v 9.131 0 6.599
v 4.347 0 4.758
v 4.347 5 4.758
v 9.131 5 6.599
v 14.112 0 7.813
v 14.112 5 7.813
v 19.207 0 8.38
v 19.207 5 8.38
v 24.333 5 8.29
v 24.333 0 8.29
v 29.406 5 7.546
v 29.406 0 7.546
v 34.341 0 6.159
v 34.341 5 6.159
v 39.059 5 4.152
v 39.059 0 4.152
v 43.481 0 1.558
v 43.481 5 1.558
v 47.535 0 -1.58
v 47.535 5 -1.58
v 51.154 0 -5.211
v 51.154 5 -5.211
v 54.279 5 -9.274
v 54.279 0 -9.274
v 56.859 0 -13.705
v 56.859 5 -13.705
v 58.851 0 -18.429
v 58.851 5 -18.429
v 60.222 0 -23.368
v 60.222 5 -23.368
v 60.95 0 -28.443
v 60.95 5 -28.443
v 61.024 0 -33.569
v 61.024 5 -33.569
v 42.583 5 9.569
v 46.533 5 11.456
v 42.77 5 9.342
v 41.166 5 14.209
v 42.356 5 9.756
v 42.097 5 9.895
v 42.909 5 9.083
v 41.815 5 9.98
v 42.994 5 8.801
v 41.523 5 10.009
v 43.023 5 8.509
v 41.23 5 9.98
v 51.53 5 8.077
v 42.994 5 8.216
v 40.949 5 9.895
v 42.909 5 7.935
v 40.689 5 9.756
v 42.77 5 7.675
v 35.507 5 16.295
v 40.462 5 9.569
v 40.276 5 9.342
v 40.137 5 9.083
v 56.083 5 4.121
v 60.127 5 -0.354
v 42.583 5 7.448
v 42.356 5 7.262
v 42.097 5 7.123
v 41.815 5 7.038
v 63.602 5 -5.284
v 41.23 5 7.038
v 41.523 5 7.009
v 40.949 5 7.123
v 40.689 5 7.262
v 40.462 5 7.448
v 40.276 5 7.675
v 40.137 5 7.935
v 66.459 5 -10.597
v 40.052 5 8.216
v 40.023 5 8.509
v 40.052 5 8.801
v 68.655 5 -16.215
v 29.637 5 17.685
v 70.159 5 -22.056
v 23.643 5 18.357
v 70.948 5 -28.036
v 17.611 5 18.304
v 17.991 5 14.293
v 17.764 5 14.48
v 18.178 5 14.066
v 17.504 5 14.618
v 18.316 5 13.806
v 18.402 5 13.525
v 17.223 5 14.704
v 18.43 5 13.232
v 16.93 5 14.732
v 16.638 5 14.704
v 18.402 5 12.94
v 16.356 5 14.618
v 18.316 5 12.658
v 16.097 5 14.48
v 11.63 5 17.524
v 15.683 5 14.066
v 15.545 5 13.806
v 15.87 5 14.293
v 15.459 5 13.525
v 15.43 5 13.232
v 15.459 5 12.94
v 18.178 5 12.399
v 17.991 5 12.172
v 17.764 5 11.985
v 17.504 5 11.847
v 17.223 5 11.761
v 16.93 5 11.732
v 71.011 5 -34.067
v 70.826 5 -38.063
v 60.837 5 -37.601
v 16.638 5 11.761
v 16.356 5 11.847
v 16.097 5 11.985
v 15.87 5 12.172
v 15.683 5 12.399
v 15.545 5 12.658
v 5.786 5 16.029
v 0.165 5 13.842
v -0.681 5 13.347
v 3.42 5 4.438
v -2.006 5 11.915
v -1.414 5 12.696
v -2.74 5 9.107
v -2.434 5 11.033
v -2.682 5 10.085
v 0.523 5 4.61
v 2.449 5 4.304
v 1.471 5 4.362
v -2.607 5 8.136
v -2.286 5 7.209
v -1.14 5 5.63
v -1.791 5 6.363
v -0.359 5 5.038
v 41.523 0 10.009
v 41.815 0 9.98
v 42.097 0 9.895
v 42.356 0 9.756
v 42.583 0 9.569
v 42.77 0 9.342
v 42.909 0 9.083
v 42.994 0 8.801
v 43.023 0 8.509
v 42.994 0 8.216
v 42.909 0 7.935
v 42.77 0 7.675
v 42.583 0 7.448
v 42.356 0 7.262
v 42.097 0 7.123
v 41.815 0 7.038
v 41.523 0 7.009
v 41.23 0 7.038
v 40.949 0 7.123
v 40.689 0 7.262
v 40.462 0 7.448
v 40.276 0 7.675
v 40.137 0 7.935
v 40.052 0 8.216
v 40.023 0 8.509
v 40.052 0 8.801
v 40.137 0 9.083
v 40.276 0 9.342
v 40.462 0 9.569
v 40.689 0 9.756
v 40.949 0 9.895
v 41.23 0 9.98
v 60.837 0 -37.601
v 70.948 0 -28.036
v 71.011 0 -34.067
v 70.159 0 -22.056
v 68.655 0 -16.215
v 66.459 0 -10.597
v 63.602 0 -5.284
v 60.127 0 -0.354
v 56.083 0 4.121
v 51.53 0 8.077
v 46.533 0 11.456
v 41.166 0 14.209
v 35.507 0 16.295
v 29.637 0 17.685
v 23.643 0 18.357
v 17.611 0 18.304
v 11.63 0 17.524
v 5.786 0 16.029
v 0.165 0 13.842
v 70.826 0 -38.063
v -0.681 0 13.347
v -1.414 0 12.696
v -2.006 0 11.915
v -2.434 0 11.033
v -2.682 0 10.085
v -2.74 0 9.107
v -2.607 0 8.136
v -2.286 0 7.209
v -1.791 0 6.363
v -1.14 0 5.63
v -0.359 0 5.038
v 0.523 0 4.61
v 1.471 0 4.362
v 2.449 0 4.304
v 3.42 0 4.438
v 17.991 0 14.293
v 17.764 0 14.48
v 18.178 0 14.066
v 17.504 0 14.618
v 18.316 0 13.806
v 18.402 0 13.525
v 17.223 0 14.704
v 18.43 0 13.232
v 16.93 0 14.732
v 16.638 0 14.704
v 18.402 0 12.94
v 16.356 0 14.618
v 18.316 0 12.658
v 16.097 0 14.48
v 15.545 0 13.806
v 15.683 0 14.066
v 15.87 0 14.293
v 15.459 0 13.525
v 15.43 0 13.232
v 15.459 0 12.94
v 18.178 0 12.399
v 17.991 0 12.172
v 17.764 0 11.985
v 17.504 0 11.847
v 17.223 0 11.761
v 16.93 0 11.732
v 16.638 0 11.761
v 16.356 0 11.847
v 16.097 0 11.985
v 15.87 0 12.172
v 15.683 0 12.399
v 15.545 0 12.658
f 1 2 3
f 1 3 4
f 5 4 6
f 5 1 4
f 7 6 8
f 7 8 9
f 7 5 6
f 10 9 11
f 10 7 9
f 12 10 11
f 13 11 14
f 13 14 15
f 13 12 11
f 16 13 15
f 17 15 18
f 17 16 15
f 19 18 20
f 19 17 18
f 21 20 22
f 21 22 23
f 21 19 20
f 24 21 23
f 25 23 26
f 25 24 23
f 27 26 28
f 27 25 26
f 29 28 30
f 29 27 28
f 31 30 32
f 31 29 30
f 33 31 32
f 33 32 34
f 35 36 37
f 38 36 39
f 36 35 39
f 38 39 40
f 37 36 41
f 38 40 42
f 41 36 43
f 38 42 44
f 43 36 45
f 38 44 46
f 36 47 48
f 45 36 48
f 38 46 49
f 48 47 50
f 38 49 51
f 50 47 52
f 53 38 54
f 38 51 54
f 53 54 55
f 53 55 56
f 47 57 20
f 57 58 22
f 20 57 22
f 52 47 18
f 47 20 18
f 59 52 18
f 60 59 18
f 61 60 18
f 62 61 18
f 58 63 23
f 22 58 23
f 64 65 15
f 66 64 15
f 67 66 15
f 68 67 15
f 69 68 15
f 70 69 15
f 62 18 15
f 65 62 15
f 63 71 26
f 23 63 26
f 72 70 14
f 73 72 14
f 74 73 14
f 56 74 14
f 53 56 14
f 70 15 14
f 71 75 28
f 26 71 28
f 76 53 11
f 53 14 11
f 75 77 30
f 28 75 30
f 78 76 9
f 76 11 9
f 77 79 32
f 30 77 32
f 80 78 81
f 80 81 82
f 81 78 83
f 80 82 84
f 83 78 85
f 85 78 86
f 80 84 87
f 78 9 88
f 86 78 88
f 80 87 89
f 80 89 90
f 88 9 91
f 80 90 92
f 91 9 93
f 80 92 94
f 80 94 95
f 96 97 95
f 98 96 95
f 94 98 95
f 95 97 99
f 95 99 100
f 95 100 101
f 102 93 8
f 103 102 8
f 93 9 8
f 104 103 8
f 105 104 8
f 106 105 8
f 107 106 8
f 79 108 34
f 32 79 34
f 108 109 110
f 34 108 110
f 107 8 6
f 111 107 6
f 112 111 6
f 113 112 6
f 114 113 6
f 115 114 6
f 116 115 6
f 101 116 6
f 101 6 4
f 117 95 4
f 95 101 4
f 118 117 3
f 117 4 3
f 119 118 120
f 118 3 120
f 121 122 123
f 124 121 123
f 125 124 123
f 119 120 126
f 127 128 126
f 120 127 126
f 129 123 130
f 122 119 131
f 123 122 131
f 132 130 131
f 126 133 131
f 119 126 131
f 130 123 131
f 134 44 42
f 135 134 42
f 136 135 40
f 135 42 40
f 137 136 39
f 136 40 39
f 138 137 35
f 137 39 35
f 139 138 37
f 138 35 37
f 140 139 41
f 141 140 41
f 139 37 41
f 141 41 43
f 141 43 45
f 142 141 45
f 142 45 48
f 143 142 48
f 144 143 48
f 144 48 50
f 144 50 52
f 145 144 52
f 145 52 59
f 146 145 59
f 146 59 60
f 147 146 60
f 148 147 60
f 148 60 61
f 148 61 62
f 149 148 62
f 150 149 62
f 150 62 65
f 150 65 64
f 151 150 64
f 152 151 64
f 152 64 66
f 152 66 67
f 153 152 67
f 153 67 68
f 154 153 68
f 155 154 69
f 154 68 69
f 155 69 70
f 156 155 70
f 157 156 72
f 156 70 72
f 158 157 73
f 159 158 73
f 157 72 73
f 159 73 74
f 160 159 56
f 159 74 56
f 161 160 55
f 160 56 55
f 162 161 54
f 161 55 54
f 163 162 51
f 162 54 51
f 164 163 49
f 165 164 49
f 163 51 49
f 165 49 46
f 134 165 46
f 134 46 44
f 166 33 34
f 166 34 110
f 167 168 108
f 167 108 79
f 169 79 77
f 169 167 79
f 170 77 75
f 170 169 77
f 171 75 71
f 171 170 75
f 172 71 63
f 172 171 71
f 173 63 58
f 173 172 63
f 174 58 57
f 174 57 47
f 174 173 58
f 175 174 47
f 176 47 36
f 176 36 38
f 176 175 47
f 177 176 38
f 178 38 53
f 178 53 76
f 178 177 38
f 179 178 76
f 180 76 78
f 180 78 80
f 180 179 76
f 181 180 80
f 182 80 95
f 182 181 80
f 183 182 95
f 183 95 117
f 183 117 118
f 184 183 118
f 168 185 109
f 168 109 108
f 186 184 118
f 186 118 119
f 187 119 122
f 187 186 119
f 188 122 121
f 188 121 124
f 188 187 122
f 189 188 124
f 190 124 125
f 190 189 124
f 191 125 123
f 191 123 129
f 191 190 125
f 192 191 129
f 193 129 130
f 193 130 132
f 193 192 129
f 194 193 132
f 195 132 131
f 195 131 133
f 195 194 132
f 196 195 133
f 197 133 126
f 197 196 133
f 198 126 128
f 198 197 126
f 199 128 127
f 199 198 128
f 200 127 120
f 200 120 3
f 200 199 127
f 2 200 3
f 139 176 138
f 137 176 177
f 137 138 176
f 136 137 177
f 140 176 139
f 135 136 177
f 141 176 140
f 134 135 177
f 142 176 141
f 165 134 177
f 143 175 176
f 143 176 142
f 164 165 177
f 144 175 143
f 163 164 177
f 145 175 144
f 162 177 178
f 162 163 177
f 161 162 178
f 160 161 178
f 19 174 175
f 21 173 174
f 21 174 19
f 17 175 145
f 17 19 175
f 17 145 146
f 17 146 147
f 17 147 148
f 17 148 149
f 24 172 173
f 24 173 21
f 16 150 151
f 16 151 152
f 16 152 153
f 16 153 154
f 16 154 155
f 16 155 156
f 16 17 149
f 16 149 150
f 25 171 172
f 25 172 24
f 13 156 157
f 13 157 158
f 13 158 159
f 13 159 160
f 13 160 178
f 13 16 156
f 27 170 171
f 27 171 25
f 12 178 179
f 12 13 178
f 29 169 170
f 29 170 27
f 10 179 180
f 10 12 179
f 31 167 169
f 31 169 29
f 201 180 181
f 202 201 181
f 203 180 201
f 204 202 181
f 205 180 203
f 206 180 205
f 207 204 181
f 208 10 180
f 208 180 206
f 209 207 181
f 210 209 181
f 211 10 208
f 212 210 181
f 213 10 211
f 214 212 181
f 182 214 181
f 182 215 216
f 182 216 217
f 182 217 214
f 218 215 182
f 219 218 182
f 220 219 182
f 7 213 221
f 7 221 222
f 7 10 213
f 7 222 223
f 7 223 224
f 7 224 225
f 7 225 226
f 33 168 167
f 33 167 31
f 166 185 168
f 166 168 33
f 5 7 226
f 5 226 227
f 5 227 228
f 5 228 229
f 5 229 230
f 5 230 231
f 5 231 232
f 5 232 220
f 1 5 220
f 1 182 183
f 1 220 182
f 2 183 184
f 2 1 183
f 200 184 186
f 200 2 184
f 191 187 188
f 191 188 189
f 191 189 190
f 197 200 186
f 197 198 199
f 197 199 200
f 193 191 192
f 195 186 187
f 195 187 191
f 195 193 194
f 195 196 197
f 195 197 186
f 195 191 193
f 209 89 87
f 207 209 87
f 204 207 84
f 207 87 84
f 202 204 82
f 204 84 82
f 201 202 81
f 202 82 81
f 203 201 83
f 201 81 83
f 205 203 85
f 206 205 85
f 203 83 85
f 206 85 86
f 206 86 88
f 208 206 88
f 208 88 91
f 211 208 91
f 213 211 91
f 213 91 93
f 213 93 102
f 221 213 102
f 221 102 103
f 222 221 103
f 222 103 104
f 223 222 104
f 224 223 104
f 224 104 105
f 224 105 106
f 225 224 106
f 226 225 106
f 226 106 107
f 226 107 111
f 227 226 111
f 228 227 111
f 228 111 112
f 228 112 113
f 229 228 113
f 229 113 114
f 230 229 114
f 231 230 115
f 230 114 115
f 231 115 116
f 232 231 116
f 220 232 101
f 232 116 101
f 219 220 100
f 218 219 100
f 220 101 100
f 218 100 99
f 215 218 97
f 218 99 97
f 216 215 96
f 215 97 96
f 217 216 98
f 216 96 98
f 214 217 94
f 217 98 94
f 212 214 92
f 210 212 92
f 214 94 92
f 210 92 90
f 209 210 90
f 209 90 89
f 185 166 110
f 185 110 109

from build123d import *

# Parameters (mm, degrees)
EXTRUDE_1_DEPTH     = 5
CUT_EXTRUDE_1_REACH = 82.779
SKETCH_2_R          = 1.5


with BuildPart() as part:
    # 草图1 → 凸台-拉伸1 (new body)
    with BuildSketch(Plane(origin=(0, 0, 0), x_dir=(1, 0, 0), z_dir=(0, 1, 0))):
        with BuildLine():
            Line((61.023746461, 33.569203074), (60.837080184, 37.600567015))
            Line((60.837080184, 37.600567015), (70.826313722, 38.06310353))
            Line((70.826313722, 38.06310353), (71.011329506, 34.067384676))
            ThreePointArc((71.011329506, 34.067384676), (49.082411457, -9.842070835), (0.164945446, -13.841976975))
            ThreePointArc((0.164945446, -13.841976975), (-2.286053035, -7.209284728), (4.346639213, -4.758286247))
            ThreePointArc((4.346639213, -4.758286247), (43.480612021, -1.558361335), (61.023746461, 33.569203074))
        make_face()
    extrude(amount=EXTRUDE_1_DEPTH)

    # 草图2 → 切除-拉伸1 (cut, up to next)
    with BuildSketch(Plane(origin=(0, 5, 0), x_dir=(1, 0, 0), z_dir=(0, 1, 0)), mode=Mode.PRIVATE) as cut_extrude_1_sk1:
        with Locations(Location((16.930413815, -13.232401329, 0), (0, 0, 270))):
            Circle(SKETCH_2_R)
    cut_extrude_1_tool1 = extrude(cut_extrude_1_sk1.sketch, amount=-CUT_EXTRUDE_1_REACH, mode=Mode.PRIVATE) & part.part
    # 草图2 → 切除-拉伸1 (cut, up to next)
    with BuildSketch(Plane(origin=(0, 5, 0), x_dir=(1, 0, 0), z_dir=(0, 1, 0)), mode=Mode.PRIVATE) as cut_extrude_1_sk2:
        with Locations(Location((41.522785914, -8.508722595, 0), (0, 0, 270))):
            Circle(SKETCH_2_R)
    cut_extrude_1_tool2 = extrude(cut_extrude_1_sk2.sketch, amount=-CUT_EXTRUDE_1_REACH, mode=Mode.PRIVATE) & part.part
    add(cut_extrude_1_tool1.solids().sort_by_distance((16.930414, 5, 13.232401))[0], mode=Mode.SUBTRACT)
    add(cut_extrude_1_tool2.solids().sort_by_distance((41.522786, 5, 8.508723))[0], mode=Mode.SUBTRACT)


solid = part.part
